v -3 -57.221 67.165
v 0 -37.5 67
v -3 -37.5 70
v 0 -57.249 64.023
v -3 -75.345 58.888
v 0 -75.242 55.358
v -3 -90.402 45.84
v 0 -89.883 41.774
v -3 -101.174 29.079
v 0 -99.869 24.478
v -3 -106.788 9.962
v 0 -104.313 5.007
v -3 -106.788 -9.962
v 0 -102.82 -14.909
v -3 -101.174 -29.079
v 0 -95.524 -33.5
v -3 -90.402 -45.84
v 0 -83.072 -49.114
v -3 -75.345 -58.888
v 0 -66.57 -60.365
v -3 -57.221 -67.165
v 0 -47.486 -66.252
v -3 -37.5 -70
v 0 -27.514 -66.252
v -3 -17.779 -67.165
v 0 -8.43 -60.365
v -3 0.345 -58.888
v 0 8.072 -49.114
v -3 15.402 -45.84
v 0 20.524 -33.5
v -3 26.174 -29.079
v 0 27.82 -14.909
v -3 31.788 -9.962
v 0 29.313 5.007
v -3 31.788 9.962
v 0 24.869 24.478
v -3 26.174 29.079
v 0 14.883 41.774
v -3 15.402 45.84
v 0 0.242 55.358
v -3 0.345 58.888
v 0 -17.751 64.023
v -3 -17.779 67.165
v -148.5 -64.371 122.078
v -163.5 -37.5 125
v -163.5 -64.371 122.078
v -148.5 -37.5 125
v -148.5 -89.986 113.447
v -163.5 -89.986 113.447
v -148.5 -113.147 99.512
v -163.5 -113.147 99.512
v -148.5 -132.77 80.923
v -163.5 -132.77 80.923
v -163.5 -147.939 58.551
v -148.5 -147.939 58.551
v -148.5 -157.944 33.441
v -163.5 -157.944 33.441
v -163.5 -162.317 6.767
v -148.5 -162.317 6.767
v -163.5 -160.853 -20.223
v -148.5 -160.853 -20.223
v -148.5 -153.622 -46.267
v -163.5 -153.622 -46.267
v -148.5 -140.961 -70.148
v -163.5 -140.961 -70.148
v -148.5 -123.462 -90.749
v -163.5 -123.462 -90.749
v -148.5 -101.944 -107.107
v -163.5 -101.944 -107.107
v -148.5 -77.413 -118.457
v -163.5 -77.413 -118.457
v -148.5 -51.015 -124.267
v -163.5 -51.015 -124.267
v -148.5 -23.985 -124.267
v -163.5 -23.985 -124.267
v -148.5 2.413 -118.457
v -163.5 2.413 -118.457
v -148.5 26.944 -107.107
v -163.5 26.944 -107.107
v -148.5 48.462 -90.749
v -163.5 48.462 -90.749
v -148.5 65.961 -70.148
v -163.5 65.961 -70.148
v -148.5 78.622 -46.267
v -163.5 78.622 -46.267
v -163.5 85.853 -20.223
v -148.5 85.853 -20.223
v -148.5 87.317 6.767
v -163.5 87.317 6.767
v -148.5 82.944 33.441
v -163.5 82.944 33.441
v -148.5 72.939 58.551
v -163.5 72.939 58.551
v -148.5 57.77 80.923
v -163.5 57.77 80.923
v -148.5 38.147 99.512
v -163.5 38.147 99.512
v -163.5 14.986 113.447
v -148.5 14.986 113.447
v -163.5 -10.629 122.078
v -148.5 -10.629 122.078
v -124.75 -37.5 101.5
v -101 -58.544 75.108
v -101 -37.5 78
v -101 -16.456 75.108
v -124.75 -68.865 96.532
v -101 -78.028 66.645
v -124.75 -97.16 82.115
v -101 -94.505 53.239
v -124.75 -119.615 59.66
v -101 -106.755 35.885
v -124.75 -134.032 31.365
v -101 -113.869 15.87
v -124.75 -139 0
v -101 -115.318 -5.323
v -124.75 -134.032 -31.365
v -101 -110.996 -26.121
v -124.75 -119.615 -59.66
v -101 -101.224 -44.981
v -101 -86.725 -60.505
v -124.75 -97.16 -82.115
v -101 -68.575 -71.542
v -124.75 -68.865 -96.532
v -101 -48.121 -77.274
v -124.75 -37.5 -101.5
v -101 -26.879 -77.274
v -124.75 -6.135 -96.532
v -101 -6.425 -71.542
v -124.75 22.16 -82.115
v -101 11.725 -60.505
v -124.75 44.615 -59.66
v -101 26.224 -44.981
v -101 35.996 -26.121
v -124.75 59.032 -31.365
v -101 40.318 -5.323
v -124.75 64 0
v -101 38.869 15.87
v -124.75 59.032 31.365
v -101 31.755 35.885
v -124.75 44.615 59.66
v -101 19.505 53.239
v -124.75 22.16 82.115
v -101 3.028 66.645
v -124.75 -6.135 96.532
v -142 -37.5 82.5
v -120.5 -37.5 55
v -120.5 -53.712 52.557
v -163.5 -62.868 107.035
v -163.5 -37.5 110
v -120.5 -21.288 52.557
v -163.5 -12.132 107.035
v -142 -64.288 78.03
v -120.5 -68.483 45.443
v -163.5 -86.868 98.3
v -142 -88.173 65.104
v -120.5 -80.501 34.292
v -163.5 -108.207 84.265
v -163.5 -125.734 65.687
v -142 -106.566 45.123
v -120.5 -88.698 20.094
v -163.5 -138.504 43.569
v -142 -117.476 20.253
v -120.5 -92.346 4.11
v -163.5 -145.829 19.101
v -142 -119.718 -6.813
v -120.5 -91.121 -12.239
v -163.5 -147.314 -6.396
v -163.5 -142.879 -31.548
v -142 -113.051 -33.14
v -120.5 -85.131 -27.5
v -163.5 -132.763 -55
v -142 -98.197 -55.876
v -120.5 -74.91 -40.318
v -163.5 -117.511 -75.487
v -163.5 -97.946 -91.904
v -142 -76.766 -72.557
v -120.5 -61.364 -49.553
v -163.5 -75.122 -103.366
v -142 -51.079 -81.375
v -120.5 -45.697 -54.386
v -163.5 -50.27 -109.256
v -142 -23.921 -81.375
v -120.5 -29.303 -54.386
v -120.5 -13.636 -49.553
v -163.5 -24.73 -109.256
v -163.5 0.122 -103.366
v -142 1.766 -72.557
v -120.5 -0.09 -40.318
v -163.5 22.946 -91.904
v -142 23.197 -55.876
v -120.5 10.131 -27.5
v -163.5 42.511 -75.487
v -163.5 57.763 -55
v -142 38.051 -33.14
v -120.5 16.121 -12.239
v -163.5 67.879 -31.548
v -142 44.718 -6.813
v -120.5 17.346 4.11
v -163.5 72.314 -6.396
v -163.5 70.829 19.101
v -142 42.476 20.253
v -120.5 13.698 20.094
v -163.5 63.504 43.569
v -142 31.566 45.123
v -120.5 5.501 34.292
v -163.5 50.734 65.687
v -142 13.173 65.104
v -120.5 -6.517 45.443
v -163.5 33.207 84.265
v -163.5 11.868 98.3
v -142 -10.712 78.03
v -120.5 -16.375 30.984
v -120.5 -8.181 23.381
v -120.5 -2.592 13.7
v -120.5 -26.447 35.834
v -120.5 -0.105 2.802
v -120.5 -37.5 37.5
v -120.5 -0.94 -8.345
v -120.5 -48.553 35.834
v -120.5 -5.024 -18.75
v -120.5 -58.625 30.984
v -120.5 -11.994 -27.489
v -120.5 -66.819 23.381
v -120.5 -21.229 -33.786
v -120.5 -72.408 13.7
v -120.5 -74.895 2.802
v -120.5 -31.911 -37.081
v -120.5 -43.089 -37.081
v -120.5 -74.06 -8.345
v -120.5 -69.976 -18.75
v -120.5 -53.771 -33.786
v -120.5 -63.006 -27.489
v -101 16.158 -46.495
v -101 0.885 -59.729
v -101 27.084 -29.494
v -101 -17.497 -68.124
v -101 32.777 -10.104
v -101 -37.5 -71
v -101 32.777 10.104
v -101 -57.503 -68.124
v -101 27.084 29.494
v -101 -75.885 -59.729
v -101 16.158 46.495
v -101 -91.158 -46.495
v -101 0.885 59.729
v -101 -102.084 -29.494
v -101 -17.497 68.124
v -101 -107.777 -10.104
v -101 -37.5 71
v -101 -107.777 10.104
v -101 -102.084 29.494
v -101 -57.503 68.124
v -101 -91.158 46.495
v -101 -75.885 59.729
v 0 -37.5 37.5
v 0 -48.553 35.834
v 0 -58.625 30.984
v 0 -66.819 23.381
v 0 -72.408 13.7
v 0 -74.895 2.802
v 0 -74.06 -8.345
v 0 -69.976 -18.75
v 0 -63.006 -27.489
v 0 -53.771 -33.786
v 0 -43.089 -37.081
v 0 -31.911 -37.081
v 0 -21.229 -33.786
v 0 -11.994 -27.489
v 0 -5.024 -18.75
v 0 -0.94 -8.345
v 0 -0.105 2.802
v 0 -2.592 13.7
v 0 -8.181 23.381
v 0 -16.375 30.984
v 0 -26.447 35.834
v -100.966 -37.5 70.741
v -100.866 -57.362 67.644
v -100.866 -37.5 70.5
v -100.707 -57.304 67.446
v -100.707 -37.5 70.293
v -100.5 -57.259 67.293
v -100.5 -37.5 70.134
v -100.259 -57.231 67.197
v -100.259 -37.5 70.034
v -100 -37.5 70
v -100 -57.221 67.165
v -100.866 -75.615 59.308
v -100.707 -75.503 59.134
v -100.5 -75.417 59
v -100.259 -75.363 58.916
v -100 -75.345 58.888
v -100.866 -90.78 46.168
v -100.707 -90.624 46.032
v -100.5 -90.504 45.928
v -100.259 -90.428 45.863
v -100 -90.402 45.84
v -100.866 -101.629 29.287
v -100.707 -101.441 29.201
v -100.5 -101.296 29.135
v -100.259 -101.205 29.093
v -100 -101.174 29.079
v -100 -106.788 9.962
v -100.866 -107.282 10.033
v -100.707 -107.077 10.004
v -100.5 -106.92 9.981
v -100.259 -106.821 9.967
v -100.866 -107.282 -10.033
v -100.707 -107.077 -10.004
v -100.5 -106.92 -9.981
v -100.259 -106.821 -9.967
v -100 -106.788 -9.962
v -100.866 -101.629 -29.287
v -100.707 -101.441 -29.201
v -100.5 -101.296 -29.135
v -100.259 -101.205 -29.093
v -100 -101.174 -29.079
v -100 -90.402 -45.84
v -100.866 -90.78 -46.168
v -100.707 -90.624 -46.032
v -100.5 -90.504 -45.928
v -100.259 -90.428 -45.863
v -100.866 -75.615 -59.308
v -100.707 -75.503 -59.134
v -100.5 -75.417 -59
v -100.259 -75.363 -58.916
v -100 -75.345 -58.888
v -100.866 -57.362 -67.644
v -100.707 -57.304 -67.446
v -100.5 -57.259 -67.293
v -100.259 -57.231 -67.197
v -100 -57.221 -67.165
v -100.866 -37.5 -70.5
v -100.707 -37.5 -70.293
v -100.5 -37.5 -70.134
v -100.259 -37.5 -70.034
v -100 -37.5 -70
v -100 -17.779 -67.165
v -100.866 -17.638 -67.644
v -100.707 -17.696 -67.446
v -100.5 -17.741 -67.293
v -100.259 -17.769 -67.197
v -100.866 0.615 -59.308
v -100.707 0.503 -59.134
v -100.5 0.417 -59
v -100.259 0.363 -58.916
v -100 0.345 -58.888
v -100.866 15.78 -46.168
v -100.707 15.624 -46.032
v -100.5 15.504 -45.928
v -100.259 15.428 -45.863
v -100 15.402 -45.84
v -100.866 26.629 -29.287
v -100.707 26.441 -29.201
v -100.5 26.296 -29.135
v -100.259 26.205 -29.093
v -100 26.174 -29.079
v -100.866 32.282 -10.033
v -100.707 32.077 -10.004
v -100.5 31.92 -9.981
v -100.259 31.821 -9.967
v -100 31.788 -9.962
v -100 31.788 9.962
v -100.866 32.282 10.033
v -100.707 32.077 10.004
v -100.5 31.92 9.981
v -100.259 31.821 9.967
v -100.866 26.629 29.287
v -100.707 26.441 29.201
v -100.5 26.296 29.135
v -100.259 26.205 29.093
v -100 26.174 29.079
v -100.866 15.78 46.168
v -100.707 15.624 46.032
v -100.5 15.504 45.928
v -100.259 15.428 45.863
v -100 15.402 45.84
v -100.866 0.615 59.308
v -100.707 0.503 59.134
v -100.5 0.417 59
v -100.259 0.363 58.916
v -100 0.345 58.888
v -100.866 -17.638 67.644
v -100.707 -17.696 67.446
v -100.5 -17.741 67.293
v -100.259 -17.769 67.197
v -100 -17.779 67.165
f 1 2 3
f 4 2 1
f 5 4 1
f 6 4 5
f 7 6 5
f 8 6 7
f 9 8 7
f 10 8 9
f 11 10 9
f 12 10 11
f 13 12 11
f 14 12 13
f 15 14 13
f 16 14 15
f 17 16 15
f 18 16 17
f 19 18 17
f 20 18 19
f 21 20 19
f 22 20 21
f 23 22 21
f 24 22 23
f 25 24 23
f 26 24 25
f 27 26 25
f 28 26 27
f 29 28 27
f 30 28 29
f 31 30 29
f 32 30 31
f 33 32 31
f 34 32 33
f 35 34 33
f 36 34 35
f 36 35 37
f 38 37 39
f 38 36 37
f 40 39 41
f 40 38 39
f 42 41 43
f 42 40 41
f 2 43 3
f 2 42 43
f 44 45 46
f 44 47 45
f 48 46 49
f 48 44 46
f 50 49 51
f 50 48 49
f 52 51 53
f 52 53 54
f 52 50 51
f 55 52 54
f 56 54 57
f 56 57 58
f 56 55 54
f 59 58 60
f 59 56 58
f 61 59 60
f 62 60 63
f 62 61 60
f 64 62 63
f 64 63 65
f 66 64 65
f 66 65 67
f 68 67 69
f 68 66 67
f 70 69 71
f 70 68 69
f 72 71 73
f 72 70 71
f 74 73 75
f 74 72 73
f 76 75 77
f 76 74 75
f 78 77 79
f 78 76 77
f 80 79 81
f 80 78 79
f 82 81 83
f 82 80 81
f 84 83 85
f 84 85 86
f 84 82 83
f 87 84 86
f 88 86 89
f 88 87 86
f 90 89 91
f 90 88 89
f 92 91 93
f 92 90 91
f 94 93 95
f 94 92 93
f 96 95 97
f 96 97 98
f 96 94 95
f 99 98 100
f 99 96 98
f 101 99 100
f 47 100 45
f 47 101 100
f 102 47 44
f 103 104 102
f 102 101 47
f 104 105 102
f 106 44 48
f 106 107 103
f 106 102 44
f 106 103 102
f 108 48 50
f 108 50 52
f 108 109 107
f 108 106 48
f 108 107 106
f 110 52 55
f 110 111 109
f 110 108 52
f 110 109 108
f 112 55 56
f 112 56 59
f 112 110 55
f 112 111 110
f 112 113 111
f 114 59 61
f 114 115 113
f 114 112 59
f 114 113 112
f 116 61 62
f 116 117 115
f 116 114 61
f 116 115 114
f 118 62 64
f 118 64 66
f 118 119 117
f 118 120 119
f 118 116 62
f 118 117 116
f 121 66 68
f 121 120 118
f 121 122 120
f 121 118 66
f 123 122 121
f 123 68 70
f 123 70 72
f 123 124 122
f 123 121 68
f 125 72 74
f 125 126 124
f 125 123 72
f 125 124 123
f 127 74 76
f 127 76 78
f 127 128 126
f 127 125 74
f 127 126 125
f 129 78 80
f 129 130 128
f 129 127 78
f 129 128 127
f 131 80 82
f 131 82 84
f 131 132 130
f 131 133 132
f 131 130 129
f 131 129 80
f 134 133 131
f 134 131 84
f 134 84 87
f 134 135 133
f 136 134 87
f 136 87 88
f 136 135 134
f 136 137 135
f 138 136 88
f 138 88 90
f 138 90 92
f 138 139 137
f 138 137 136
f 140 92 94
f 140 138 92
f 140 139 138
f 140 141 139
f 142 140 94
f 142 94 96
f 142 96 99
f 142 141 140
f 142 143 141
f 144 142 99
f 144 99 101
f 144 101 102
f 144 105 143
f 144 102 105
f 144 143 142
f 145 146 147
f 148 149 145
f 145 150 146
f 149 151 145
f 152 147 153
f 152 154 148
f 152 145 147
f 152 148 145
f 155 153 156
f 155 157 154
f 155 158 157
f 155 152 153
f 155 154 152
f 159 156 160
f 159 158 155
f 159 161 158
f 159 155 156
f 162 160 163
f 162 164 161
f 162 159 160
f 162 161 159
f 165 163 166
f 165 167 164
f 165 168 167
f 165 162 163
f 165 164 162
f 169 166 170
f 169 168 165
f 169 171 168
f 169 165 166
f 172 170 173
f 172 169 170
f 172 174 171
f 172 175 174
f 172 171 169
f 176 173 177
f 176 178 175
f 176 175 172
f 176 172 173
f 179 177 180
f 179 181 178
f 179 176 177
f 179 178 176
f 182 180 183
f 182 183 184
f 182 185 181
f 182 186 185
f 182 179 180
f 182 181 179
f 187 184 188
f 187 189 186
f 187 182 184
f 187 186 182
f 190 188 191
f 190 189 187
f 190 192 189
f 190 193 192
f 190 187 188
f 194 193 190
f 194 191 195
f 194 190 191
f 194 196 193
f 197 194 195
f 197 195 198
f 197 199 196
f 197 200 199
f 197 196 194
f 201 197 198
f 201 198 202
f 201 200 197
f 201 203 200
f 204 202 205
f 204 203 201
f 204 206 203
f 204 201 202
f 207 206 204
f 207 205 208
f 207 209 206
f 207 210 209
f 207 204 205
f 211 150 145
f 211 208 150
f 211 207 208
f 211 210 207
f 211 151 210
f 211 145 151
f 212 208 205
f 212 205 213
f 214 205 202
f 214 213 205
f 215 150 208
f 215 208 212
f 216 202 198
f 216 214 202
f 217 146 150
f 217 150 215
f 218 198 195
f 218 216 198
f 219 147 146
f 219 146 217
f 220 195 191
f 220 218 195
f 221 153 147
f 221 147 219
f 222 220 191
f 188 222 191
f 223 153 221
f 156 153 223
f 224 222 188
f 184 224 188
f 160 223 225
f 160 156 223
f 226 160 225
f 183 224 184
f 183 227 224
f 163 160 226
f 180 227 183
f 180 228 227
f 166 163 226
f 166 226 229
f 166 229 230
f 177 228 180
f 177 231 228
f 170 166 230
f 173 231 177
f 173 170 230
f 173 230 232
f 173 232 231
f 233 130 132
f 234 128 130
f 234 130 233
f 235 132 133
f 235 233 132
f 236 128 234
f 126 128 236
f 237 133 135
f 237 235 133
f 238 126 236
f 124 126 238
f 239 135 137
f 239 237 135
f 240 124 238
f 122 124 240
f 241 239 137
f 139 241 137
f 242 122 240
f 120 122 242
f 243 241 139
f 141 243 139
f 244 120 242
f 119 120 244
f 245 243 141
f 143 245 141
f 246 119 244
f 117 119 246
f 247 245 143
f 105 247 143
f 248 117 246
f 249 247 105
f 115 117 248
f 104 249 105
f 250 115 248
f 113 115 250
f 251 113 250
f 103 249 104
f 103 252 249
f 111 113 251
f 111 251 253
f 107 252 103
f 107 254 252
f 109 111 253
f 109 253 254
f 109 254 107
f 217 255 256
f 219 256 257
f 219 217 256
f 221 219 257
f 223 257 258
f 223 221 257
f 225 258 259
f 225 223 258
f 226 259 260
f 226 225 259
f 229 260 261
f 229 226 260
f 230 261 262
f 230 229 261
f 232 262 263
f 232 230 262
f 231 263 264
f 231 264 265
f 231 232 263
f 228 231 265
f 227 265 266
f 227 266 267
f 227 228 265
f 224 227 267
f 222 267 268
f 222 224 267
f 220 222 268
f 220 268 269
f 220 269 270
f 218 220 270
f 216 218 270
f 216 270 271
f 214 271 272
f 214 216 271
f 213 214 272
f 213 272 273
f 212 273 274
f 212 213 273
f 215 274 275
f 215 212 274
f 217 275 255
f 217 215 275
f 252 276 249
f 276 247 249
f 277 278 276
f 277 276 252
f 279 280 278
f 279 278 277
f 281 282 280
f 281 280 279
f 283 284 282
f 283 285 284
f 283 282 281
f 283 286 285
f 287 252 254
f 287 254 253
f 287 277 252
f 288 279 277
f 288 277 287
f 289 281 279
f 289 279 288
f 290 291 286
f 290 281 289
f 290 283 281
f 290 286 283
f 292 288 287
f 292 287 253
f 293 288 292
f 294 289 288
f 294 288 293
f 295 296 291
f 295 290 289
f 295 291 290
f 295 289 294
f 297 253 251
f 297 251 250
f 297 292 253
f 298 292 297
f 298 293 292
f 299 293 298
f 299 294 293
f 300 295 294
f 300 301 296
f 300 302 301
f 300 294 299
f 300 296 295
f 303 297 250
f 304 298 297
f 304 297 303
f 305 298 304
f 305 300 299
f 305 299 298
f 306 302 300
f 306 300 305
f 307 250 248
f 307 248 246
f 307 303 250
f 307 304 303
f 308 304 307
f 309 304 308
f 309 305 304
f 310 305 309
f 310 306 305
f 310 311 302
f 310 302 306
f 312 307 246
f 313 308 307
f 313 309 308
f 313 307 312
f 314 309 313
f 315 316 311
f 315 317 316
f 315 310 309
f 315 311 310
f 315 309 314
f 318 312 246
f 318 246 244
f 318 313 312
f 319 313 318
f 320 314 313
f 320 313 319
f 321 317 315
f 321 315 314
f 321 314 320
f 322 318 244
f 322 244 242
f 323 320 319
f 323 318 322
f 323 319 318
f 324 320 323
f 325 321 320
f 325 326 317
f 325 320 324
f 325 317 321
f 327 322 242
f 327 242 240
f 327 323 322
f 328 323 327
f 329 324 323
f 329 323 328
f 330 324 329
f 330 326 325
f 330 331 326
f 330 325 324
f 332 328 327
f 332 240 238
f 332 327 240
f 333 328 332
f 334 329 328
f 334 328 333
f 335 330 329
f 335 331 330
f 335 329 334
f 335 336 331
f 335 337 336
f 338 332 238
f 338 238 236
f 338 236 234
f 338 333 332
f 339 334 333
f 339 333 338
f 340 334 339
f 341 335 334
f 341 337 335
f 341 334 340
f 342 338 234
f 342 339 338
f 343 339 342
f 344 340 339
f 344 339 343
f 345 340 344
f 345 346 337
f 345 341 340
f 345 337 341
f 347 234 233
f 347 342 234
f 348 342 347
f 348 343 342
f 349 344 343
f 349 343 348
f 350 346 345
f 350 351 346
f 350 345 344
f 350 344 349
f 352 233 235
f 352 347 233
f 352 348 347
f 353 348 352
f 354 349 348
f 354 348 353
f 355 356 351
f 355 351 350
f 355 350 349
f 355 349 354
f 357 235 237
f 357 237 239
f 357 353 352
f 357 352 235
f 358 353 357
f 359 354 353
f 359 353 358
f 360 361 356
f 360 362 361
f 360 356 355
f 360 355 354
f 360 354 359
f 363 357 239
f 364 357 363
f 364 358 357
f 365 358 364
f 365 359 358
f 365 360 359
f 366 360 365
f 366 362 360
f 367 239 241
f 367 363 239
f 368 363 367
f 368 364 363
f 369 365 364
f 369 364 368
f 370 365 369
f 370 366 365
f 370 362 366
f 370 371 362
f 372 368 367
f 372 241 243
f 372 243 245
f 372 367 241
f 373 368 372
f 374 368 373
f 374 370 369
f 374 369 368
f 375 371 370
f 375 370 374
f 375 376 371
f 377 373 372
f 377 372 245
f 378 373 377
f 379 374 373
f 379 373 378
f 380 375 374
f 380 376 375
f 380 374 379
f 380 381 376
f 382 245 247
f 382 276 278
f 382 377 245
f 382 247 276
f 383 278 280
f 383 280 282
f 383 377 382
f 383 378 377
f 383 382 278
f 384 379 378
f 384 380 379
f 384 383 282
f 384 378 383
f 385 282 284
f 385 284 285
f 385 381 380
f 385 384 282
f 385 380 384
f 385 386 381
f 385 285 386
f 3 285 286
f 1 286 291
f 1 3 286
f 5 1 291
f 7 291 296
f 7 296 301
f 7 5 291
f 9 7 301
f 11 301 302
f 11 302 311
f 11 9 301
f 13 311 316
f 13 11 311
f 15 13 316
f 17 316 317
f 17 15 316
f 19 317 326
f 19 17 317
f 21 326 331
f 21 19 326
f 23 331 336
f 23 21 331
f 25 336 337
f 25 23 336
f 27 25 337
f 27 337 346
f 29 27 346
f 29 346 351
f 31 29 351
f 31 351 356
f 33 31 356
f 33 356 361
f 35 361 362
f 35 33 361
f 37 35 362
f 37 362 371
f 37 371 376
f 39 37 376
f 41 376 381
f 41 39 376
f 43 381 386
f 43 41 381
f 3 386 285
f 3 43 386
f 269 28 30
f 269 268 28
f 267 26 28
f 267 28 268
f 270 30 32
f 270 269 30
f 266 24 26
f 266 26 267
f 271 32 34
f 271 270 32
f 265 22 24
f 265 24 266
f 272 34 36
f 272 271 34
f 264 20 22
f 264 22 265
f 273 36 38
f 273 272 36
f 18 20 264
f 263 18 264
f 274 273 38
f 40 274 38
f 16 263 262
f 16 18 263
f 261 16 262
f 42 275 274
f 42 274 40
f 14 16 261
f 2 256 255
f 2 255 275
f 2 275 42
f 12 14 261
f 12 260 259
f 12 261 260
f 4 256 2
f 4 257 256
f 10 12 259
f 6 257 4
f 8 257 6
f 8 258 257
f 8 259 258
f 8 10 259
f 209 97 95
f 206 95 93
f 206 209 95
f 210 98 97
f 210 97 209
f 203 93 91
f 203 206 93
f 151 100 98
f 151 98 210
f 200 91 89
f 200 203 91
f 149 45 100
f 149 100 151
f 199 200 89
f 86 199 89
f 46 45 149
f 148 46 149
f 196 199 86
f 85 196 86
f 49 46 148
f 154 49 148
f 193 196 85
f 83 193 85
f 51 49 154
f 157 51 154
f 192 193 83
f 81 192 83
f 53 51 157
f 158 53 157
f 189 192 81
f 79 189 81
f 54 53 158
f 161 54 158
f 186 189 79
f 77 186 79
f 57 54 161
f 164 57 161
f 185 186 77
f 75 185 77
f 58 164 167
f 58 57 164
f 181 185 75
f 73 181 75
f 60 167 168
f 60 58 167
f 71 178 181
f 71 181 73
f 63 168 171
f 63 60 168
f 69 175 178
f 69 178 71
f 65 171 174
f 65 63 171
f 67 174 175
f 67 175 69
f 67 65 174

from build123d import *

# Parameters (mm, degrees)
FILLET_1_R     = 1
CHAMFER_1_SIZE = 3


with BuildPart() as part:
    # 草图1 → 旋转1 (revolve)
    with BuildSketch(Plane.XY, mode=Mode.PRIVATE) as revolve_1_sk:
        Polygon((0, 0), (-120.5, 0), (-120.5, 17.5), (-163.5, 72.5), (-163.5, 87.5), (-148.5, 87.5), (-101, 40.5), (-101, 32.5), (0, 32.5), align=None)
    revolve(revolve_1_sk.sketch.rotate(Axis((-120.5, -37.5, 0), (1, 0, 0)), 90), axis=Axis((-120.5, -37.5, 0), (1, 0, 0)))

    # 圆角1
    fillet_1_edges = [part.edges().sort_by_distance(p)[0] for p in [
        (-101, -37.5, -70),
    ]]
    fillet(fillet_1_edges, radius=FILLET_1_R)

    # 倒角1
    chamfer_1_edges = [part.edges().sort_by_distance(p)[0] for p in [
        (0, -37.5, -70),
    ]]
    chamfer(chamfer_1_edges, length=CHAMFER_1_SIZE)


solid = part.part
